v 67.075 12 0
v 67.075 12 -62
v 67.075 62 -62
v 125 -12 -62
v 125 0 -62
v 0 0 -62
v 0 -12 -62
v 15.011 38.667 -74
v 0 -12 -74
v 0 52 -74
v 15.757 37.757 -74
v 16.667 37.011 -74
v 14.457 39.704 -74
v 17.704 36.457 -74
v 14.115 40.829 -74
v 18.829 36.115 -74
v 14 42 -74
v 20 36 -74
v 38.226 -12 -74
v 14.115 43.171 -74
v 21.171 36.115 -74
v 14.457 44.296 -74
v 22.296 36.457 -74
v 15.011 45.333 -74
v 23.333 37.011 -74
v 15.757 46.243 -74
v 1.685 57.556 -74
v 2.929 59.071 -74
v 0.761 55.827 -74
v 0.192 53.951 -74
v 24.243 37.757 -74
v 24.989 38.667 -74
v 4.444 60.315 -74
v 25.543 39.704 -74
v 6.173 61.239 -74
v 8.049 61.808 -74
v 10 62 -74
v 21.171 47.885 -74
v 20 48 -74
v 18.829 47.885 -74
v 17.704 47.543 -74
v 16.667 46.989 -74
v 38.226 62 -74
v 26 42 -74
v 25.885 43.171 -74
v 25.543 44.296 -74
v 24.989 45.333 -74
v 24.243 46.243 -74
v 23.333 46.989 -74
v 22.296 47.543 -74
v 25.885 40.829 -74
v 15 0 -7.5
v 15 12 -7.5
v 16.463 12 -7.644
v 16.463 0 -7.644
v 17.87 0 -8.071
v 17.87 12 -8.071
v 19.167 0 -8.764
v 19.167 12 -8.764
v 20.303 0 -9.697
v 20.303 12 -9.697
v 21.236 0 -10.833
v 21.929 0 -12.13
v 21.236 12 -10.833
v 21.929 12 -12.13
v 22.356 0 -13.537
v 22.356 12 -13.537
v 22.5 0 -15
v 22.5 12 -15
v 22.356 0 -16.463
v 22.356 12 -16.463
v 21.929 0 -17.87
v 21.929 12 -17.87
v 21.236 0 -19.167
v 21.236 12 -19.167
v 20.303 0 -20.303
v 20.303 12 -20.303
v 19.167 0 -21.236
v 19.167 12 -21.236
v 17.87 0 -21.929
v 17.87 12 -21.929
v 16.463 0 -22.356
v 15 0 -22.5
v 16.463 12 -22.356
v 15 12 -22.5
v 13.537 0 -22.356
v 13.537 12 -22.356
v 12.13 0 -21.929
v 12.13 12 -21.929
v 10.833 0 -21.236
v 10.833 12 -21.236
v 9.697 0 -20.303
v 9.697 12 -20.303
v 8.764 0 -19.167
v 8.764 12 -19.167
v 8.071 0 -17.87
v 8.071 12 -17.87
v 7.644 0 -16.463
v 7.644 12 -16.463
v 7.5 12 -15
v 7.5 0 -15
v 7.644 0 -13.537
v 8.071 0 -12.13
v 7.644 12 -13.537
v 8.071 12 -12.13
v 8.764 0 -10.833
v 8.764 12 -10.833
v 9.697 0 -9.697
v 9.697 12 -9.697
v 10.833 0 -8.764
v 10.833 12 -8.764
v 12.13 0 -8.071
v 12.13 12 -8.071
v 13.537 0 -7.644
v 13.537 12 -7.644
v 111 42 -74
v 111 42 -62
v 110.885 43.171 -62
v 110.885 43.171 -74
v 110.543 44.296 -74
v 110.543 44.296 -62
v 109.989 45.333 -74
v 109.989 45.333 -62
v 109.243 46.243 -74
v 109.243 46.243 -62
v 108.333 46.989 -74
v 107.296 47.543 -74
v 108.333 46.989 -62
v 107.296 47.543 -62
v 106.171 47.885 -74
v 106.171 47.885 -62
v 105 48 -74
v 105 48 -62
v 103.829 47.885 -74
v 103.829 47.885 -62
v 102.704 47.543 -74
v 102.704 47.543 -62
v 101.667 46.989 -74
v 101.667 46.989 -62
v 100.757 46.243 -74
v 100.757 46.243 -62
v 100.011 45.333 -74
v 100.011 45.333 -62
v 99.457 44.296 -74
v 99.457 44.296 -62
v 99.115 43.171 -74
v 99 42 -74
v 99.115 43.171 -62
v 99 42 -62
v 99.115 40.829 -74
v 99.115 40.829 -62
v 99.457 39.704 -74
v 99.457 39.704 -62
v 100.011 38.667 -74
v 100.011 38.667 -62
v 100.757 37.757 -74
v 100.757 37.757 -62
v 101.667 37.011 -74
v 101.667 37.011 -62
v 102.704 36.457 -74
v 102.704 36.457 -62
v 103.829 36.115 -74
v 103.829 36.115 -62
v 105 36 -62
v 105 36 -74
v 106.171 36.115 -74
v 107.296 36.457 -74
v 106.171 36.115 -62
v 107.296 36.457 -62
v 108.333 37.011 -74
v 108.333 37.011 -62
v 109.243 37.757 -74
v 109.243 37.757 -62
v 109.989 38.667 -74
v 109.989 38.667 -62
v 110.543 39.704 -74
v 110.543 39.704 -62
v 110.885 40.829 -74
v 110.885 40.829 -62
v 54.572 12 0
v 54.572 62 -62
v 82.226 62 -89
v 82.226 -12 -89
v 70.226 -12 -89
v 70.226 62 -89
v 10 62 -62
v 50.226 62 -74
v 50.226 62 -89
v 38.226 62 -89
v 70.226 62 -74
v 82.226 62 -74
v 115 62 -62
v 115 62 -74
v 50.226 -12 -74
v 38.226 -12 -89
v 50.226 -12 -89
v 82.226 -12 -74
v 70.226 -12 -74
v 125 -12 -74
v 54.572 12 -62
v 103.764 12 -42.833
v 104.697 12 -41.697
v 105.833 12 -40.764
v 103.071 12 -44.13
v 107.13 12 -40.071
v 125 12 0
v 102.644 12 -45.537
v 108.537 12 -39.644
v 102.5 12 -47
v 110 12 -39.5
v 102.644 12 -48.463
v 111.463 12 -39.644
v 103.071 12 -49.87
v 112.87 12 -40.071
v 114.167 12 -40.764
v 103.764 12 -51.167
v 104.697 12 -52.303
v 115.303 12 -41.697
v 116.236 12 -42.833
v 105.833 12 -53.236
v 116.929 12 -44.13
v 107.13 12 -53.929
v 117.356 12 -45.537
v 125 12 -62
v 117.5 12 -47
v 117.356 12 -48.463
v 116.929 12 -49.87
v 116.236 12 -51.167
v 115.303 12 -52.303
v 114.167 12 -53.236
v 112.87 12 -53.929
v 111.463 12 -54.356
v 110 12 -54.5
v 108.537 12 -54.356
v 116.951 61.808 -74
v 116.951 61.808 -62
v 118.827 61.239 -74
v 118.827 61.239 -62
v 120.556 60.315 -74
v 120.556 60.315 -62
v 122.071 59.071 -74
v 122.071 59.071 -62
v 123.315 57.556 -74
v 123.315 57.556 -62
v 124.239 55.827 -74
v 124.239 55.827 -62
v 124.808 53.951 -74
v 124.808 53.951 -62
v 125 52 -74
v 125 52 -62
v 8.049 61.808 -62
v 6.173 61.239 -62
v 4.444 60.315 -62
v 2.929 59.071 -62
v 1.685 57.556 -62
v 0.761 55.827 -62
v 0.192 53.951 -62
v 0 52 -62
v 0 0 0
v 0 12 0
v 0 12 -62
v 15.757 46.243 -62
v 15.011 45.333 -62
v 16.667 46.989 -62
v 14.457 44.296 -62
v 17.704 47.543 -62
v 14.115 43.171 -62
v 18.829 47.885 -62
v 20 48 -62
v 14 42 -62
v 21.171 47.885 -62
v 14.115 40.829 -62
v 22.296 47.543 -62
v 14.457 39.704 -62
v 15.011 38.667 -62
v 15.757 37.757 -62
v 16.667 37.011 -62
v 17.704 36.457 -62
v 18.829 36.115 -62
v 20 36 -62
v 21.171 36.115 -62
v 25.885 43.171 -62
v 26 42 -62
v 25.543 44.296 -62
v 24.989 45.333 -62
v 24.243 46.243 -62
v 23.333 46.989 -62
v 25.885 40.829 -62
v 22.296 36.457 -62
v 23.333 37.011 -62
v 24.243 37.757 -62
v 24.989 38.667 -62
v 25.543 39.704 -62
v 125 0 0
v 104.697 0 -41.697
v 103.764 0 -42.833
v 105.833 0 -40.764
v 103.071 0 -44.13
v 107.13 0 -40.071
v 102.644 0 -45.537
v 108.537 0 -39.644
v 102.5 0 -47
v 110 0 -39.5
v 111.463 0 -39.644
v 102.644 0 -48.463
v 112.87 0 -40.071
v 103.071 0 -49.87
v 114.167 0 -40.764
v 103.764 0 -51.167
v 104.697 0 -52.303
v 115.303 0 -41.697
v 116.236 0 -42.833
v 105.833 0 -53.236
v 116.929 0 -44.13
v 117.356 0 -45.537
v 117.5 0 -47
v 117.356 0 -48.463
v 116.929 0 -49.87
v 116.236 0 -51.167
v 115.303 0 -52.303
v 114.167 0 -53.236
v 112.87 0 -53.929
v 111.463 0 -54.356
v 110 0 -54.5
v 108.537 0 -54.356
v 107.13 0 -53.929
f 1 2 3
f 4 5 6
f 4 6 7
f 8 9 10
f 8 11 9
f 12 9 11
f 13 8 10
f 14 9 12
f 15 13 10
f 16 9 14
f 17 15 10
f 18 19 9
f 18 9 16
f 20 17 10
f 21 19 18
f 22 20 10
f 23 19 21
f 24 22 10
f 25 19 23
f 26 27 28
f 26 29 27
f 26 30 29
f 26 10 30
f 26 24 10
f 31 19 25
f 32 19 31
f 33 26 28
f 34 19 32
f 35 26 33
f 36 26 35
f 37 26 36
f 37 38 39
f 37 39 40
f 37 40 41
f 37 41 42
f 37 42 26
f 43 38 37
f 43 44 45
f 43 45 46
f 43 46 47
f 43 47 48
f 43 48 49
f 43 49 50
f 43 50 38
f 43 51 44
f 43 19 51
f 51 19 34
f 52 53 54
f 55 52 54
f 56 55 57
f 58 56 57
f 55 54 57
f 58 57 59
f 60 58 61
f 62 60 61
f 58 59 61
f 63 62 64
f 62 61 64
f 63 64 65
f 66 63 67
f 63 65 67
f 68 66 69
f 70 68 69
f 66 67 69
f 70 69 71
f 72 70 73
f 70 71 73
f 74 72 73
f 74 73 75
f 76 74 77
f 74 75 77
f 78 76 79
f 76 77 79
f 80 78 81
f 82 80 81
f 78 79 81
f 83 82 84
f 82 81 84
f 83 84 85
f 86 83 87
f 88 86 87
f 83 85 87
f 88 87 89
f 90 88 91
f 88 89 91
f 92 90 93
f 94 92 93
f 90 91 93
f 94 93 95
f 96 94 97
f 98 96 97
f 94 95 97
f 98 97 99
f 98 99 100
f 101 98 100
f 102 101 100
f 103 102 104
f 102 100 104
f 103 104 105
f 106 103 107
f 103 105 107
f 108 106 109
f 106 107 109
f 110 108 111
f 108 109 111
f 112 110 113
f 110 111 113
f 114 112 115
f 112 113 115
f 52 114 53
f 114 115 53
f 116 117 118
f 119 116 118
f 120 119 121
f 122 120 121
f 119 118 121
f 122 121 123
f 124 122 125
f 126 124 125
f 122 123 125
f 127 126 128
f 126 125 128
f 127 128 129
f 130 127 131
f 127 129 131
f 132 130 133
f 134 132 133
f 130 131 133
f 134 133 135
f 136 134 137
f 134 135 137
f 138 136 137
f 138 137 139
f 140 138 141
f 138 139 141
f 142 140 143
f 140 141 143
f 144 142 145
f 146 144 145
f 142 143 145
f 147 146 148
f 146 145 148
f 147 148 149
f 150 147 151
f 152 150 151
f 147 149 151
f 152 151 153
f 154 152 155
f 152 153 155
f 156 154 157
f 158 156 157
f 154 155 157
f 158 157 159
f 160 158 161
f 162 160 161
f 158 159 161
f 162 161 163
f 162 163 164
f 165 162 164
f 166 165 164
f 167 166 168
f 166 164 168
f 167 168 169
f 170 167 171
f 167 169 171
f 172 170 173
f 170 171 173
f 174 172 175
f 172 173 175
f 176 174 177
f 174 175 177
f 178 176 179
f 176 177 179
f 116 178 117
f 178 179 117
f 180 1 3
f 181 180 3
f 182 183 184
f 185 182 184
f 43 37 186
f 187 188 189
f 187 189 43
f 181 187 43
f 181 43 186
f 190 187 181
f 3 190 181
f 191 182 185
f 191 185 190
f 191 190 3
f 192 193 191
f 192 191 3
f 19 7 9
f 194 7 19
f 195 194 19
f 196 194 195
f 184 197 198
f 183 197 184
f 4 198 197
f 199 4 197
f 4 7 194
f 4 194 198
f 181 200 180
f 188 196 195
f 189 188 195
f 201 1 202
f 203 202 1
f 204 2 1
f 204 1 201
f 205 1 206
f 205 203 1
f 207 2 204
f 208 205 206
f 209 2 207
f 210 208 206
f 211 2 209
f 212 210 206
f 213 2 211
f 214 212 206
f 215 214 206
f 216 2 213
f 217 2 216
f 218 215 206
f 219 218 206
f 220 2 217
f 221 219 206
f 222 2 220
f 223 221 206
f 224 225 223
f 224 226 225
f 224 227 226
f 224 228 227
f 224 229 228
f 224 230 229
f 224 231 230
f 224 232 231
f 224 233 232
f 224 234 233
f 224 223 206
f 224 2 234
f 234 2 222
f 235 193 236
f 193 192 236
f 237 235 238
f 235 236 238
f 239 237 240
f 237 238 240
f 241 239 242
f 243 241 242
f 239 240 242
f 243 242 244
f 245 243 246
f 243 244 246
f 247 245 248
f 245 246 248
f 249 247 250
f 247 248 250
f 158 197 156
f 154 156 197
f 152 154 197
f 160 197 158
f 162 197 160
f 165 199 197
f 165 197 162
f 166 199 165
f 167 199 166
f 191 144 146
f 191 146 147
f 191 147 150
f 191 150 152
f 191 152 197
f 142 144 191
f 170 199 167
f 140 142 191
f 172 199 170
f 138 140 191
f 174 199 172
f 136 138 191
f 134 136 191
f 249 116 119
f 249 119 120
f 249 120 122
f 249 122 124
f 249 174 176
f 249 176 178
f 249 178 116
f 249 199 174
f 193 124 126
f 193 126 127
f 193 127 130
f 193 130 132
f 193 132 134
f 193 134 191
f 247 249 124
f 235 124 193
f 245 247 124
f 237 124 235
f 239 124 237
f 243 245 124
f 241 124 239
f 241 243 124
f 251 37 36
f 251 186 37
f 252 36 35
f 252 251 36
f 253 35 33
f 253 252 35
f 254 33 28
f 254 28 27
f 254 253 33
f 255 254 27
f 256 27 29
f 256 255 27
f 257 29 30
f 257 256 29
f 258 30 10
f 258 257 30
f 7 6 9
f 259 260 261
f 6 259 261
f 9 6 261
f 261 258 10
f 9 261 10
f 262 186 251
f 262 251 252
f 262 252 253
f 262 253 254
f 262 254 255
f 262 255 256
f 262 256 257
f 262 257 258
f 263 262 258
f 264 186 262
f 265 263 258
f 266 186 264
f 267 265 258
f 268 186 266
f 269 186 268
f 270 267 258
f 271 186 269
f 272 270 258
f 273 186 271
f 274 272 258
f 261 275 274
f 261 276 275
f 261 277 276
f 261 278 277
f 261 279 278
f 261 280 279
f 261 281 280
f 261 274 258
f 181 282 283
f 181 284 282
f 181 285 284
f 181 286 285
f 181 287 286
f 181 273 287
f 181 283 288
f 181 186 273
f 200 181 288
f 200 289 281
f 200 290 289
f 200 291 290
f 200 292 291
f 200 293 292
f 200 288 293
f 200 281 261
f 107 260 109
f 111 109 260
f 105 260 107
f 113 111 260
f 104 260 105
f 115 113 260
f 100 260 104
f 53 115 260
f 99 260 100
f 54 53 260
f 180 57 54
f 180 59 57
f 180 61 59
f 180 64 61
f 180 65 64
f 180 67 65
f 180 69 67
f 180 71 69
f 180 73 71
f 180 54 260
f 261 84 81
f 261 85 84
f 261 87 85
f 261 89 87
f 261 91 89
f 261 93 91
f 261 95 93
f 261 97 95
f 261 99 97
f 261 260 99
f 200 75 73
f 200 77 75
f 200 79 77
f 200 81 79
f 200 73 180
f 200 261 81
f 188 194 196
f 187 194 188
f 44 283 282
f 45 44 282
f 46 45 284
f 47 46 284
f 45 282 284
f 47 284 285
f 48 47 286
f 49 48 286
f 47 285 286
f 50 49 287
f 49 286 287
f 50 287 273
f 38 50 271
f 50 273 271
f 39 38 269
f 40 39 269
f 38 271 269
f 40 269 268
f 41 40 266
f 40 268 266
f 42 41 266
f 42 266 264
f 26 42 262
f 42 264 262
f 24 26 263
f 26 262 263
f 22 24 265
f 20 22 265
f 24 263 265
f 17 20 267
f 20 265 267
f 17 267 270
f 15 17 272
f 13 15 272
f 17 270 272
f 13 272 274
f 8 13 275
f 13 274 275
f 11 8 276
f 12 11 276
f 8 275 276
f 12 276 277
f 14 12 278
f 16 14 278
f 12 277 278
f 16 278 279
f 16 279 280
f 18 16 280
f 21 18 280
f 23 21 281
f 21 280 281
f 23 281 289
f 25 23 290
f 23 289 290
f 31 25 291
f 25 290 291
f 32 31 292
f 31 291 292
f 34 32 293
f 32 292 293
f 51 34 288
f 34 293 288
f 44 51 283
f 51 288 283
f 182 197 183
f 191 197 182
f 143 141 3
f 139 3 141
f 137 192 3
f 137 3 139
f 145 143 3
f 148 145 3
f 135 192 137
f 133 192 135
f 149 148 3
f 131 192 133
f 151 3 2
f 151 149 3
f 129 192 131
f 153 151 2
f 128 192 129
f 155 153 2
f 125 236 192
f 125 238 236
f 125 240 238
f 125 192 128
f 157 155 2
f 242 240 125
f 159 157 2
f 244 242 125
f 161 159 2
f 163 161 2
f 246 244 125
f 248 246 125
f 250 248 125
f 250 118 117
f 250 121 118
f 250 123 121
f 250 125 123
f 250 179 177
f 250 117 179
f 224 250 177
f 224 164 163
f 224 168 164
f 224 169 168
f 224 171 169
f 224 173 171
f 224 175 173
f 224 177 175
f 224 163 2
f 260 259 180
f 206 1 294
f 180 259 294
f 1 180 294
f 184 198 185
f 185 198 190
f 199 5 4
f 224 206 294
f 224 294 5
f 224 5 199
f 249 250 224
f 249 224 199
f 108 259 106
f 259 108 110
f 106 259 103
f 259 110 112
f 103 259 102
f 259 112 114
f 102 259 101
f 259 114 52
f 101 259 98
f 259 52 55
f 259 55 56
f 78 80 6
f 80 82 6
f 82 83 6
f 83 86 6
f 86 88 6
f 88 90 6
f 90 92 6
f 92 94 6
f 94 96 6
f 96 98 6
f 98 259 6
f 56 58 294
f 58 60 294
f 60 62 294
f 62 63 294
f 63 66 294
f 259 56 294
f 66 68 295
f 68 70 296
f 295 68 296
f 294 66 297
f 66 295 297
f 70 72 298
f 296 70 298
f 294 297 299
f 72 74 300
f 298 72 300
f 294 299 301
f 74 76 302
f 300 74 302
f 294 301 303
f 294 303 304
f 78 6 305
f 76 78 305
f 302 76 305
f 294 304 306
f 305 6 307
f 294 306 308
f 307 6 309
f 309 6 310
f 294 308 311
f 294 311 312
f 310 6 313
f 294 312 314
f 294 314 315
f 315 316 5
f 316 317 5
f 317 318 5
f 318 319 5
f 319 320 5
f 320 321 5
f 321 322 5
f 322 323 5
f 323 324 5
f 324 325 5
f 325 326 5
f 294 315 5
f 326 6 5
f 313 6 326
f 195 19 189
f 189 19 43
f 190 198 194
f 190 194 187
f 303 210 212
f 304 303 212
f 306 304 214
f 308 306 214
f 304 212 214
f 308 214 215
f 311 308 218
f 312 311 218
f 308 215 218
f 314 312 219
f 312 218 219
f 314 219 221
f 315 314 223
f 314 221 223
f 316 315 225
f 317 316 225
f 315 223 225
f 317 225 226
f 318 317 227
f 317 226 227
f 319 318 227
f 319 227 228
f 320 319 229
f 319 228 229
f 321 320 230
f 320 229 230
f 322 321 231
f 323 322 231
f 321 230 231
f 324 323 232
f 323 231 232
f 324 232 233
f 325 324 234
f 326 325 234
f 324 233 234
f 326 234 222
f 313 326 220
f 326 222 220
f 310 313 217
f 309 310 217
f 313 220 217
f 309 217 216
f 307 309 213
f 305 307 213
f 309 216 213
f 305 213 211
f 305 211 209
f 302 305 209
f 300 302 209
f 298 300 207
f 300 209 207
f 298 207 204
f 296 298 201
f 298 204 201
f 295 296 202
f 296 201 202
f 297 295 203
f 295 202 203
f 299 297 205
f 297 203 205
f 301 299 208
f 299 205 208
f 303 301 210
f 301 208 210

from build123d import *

# Parameters (mm, degrees)
SKETCH1_W           = 125
SKETCH1_H           = 62
SKETCH1_R           = 7.5
BOSS_EXTRUDE1_DEPTH = 12
BOSS_EXTRUDE3_DEPTH = 125
SKETCH7_W           = 12
SKETCH7_H           = 74
BOSS_EXTRUDE6_DEPTH = 15
SKETCH8_W           = 12.503423745
SKETCH8_H           = 50
BOSS_EXTRUDE7_DEPTH = 62
CUT_EXTRUDE1_DEPTH  = 62
FILLET1_R           = 10
FILLET2_R           = 10
SKETCH10_R          = 7.5
CUT_EXTRUDE2_DEPTH  = 12
SKETCH11_R          = 6
CUT_EXTRUDE3_DEPTH  = 12


with BuildPart() as part:
    # Sketch1 → Boss-Extrude1 (new body)
    with BuildSketch(Plane(origin=(0, 0, 0), x_dir=(1, 0, 0), z_dir=(0, 1, 0))):
        with Locations((62.5, 31)):
            Rectangle(SKETCH1_W, SKETCH1_H)
        with Locations(Location((15, 15, 0), (0, 0, 270))):
            Circle(SKETCH1_R, mode=Mode.SUBTRACT)
        with Locations(Location((110, 47, 0), (0, 0, 270))):
            Circle(SKETCH1_R, mode=Mode.SUBTRACT)
    extrude(amount=BOSS_EXTRUDE1_DEPTH)

    # Sketch2 → Boss-Extrude3 (add)
    with BuildSketch(Plane(origin=(125, 0, 0), x_dir=(0, 0, -1), z_dir=(1, 0, 0))):
        Polygon((62, 0), (62, -12), (74, -12), (74, 62), (62, 62), (62, 12), (0, 12), (0, 0), align=None)
    extrude(amount=-BOSS_EXTRUDE3_DEPTH)

    # Sketch7 → Boss-Extrude6 (add)
    with BuildSketch(Plane(origin=(0, 0, -74), x_dir=(-1, 0, 0), z_dir=(0, 0, -1))):
        with Locations((-76.226215006, 25)):
            Rectangle(SKETCH7_W, SKETCH7_H)
        with Locations((-44.226215006, 25)):
            Rectangle(SKETCH7_W, SKETCH7_H)
    extrude(amount=BOSS_EXTRUDE6_DEPTH)

    # Sketch8 → Boss-Extrude7 (add)
    with BuildSketch(Plane.XY.offset(-62)):
        with Locations((60.823295538, 37)):
            Rectangle(SKETCH8_W, SKETCH8_H)
    extrude(amount=BOSS_EXTRUDE7_DEPTH)

    # Sketch9 → Cut-Extrude1 (cut)
    with BuildSketch(Plane(origin=(67.07500741, 0, 0), x_dir=(0, 0, -1), z_dir=(1, 0, 0))):
        Polygon((0, 12), (62, 62), (0, 62), align=None)
    extrude(amount=-CUT_EXTRUDE1_DEPTH, mode=Mode.SUBTRACT)

    # Fillet1
    fillet1_edges = [part.edges().sort_by_distance(p)[0] for p in [
        (125, 62, -68),
    ]]
    fillet(fillet1_edges, radius=FILLET1_R)

    # Fillet2
    fillet2_edges = [part.edges().sort_by_distance(p)[0] for p in [
        (0, 62, -68),
    ]]
    fillet(fillet2_edges, radius=FILLET2_R)

    # Sketch10 → Cut-Extrude2 (cut)
    with BuildSketch(Plane(origin=(0, 12, 0), x_dir=(1, 0, 0), z_dir=(0, 1, 0))):
        with Locations(Location((15, 15, 0), (0, 0, 270))):
            Circle(SKETCH10_R)
        with Locations(Location((110, 47, 0), (0, 0, 270))):
            Circle(SKETCH10_R)
    extrude(amount=-CUT_EXTRUDE2_DEPTH, mode=Mode.SUBTRACT)

    # Sketch11 → Cut-Extrude3 (cut)
    with BuildSketch(Plane.XY.offset(-62)):
        with Locations((105, 42)):
            Circle(SKETCH11_R)
        with Locations((20, 42)):
            Circle(SKETCH11_R)
    extrude(amount=-CUT_EXTRUDE3_DEPTH, mode=Mode.SUBTRACT)


solid = part.part
